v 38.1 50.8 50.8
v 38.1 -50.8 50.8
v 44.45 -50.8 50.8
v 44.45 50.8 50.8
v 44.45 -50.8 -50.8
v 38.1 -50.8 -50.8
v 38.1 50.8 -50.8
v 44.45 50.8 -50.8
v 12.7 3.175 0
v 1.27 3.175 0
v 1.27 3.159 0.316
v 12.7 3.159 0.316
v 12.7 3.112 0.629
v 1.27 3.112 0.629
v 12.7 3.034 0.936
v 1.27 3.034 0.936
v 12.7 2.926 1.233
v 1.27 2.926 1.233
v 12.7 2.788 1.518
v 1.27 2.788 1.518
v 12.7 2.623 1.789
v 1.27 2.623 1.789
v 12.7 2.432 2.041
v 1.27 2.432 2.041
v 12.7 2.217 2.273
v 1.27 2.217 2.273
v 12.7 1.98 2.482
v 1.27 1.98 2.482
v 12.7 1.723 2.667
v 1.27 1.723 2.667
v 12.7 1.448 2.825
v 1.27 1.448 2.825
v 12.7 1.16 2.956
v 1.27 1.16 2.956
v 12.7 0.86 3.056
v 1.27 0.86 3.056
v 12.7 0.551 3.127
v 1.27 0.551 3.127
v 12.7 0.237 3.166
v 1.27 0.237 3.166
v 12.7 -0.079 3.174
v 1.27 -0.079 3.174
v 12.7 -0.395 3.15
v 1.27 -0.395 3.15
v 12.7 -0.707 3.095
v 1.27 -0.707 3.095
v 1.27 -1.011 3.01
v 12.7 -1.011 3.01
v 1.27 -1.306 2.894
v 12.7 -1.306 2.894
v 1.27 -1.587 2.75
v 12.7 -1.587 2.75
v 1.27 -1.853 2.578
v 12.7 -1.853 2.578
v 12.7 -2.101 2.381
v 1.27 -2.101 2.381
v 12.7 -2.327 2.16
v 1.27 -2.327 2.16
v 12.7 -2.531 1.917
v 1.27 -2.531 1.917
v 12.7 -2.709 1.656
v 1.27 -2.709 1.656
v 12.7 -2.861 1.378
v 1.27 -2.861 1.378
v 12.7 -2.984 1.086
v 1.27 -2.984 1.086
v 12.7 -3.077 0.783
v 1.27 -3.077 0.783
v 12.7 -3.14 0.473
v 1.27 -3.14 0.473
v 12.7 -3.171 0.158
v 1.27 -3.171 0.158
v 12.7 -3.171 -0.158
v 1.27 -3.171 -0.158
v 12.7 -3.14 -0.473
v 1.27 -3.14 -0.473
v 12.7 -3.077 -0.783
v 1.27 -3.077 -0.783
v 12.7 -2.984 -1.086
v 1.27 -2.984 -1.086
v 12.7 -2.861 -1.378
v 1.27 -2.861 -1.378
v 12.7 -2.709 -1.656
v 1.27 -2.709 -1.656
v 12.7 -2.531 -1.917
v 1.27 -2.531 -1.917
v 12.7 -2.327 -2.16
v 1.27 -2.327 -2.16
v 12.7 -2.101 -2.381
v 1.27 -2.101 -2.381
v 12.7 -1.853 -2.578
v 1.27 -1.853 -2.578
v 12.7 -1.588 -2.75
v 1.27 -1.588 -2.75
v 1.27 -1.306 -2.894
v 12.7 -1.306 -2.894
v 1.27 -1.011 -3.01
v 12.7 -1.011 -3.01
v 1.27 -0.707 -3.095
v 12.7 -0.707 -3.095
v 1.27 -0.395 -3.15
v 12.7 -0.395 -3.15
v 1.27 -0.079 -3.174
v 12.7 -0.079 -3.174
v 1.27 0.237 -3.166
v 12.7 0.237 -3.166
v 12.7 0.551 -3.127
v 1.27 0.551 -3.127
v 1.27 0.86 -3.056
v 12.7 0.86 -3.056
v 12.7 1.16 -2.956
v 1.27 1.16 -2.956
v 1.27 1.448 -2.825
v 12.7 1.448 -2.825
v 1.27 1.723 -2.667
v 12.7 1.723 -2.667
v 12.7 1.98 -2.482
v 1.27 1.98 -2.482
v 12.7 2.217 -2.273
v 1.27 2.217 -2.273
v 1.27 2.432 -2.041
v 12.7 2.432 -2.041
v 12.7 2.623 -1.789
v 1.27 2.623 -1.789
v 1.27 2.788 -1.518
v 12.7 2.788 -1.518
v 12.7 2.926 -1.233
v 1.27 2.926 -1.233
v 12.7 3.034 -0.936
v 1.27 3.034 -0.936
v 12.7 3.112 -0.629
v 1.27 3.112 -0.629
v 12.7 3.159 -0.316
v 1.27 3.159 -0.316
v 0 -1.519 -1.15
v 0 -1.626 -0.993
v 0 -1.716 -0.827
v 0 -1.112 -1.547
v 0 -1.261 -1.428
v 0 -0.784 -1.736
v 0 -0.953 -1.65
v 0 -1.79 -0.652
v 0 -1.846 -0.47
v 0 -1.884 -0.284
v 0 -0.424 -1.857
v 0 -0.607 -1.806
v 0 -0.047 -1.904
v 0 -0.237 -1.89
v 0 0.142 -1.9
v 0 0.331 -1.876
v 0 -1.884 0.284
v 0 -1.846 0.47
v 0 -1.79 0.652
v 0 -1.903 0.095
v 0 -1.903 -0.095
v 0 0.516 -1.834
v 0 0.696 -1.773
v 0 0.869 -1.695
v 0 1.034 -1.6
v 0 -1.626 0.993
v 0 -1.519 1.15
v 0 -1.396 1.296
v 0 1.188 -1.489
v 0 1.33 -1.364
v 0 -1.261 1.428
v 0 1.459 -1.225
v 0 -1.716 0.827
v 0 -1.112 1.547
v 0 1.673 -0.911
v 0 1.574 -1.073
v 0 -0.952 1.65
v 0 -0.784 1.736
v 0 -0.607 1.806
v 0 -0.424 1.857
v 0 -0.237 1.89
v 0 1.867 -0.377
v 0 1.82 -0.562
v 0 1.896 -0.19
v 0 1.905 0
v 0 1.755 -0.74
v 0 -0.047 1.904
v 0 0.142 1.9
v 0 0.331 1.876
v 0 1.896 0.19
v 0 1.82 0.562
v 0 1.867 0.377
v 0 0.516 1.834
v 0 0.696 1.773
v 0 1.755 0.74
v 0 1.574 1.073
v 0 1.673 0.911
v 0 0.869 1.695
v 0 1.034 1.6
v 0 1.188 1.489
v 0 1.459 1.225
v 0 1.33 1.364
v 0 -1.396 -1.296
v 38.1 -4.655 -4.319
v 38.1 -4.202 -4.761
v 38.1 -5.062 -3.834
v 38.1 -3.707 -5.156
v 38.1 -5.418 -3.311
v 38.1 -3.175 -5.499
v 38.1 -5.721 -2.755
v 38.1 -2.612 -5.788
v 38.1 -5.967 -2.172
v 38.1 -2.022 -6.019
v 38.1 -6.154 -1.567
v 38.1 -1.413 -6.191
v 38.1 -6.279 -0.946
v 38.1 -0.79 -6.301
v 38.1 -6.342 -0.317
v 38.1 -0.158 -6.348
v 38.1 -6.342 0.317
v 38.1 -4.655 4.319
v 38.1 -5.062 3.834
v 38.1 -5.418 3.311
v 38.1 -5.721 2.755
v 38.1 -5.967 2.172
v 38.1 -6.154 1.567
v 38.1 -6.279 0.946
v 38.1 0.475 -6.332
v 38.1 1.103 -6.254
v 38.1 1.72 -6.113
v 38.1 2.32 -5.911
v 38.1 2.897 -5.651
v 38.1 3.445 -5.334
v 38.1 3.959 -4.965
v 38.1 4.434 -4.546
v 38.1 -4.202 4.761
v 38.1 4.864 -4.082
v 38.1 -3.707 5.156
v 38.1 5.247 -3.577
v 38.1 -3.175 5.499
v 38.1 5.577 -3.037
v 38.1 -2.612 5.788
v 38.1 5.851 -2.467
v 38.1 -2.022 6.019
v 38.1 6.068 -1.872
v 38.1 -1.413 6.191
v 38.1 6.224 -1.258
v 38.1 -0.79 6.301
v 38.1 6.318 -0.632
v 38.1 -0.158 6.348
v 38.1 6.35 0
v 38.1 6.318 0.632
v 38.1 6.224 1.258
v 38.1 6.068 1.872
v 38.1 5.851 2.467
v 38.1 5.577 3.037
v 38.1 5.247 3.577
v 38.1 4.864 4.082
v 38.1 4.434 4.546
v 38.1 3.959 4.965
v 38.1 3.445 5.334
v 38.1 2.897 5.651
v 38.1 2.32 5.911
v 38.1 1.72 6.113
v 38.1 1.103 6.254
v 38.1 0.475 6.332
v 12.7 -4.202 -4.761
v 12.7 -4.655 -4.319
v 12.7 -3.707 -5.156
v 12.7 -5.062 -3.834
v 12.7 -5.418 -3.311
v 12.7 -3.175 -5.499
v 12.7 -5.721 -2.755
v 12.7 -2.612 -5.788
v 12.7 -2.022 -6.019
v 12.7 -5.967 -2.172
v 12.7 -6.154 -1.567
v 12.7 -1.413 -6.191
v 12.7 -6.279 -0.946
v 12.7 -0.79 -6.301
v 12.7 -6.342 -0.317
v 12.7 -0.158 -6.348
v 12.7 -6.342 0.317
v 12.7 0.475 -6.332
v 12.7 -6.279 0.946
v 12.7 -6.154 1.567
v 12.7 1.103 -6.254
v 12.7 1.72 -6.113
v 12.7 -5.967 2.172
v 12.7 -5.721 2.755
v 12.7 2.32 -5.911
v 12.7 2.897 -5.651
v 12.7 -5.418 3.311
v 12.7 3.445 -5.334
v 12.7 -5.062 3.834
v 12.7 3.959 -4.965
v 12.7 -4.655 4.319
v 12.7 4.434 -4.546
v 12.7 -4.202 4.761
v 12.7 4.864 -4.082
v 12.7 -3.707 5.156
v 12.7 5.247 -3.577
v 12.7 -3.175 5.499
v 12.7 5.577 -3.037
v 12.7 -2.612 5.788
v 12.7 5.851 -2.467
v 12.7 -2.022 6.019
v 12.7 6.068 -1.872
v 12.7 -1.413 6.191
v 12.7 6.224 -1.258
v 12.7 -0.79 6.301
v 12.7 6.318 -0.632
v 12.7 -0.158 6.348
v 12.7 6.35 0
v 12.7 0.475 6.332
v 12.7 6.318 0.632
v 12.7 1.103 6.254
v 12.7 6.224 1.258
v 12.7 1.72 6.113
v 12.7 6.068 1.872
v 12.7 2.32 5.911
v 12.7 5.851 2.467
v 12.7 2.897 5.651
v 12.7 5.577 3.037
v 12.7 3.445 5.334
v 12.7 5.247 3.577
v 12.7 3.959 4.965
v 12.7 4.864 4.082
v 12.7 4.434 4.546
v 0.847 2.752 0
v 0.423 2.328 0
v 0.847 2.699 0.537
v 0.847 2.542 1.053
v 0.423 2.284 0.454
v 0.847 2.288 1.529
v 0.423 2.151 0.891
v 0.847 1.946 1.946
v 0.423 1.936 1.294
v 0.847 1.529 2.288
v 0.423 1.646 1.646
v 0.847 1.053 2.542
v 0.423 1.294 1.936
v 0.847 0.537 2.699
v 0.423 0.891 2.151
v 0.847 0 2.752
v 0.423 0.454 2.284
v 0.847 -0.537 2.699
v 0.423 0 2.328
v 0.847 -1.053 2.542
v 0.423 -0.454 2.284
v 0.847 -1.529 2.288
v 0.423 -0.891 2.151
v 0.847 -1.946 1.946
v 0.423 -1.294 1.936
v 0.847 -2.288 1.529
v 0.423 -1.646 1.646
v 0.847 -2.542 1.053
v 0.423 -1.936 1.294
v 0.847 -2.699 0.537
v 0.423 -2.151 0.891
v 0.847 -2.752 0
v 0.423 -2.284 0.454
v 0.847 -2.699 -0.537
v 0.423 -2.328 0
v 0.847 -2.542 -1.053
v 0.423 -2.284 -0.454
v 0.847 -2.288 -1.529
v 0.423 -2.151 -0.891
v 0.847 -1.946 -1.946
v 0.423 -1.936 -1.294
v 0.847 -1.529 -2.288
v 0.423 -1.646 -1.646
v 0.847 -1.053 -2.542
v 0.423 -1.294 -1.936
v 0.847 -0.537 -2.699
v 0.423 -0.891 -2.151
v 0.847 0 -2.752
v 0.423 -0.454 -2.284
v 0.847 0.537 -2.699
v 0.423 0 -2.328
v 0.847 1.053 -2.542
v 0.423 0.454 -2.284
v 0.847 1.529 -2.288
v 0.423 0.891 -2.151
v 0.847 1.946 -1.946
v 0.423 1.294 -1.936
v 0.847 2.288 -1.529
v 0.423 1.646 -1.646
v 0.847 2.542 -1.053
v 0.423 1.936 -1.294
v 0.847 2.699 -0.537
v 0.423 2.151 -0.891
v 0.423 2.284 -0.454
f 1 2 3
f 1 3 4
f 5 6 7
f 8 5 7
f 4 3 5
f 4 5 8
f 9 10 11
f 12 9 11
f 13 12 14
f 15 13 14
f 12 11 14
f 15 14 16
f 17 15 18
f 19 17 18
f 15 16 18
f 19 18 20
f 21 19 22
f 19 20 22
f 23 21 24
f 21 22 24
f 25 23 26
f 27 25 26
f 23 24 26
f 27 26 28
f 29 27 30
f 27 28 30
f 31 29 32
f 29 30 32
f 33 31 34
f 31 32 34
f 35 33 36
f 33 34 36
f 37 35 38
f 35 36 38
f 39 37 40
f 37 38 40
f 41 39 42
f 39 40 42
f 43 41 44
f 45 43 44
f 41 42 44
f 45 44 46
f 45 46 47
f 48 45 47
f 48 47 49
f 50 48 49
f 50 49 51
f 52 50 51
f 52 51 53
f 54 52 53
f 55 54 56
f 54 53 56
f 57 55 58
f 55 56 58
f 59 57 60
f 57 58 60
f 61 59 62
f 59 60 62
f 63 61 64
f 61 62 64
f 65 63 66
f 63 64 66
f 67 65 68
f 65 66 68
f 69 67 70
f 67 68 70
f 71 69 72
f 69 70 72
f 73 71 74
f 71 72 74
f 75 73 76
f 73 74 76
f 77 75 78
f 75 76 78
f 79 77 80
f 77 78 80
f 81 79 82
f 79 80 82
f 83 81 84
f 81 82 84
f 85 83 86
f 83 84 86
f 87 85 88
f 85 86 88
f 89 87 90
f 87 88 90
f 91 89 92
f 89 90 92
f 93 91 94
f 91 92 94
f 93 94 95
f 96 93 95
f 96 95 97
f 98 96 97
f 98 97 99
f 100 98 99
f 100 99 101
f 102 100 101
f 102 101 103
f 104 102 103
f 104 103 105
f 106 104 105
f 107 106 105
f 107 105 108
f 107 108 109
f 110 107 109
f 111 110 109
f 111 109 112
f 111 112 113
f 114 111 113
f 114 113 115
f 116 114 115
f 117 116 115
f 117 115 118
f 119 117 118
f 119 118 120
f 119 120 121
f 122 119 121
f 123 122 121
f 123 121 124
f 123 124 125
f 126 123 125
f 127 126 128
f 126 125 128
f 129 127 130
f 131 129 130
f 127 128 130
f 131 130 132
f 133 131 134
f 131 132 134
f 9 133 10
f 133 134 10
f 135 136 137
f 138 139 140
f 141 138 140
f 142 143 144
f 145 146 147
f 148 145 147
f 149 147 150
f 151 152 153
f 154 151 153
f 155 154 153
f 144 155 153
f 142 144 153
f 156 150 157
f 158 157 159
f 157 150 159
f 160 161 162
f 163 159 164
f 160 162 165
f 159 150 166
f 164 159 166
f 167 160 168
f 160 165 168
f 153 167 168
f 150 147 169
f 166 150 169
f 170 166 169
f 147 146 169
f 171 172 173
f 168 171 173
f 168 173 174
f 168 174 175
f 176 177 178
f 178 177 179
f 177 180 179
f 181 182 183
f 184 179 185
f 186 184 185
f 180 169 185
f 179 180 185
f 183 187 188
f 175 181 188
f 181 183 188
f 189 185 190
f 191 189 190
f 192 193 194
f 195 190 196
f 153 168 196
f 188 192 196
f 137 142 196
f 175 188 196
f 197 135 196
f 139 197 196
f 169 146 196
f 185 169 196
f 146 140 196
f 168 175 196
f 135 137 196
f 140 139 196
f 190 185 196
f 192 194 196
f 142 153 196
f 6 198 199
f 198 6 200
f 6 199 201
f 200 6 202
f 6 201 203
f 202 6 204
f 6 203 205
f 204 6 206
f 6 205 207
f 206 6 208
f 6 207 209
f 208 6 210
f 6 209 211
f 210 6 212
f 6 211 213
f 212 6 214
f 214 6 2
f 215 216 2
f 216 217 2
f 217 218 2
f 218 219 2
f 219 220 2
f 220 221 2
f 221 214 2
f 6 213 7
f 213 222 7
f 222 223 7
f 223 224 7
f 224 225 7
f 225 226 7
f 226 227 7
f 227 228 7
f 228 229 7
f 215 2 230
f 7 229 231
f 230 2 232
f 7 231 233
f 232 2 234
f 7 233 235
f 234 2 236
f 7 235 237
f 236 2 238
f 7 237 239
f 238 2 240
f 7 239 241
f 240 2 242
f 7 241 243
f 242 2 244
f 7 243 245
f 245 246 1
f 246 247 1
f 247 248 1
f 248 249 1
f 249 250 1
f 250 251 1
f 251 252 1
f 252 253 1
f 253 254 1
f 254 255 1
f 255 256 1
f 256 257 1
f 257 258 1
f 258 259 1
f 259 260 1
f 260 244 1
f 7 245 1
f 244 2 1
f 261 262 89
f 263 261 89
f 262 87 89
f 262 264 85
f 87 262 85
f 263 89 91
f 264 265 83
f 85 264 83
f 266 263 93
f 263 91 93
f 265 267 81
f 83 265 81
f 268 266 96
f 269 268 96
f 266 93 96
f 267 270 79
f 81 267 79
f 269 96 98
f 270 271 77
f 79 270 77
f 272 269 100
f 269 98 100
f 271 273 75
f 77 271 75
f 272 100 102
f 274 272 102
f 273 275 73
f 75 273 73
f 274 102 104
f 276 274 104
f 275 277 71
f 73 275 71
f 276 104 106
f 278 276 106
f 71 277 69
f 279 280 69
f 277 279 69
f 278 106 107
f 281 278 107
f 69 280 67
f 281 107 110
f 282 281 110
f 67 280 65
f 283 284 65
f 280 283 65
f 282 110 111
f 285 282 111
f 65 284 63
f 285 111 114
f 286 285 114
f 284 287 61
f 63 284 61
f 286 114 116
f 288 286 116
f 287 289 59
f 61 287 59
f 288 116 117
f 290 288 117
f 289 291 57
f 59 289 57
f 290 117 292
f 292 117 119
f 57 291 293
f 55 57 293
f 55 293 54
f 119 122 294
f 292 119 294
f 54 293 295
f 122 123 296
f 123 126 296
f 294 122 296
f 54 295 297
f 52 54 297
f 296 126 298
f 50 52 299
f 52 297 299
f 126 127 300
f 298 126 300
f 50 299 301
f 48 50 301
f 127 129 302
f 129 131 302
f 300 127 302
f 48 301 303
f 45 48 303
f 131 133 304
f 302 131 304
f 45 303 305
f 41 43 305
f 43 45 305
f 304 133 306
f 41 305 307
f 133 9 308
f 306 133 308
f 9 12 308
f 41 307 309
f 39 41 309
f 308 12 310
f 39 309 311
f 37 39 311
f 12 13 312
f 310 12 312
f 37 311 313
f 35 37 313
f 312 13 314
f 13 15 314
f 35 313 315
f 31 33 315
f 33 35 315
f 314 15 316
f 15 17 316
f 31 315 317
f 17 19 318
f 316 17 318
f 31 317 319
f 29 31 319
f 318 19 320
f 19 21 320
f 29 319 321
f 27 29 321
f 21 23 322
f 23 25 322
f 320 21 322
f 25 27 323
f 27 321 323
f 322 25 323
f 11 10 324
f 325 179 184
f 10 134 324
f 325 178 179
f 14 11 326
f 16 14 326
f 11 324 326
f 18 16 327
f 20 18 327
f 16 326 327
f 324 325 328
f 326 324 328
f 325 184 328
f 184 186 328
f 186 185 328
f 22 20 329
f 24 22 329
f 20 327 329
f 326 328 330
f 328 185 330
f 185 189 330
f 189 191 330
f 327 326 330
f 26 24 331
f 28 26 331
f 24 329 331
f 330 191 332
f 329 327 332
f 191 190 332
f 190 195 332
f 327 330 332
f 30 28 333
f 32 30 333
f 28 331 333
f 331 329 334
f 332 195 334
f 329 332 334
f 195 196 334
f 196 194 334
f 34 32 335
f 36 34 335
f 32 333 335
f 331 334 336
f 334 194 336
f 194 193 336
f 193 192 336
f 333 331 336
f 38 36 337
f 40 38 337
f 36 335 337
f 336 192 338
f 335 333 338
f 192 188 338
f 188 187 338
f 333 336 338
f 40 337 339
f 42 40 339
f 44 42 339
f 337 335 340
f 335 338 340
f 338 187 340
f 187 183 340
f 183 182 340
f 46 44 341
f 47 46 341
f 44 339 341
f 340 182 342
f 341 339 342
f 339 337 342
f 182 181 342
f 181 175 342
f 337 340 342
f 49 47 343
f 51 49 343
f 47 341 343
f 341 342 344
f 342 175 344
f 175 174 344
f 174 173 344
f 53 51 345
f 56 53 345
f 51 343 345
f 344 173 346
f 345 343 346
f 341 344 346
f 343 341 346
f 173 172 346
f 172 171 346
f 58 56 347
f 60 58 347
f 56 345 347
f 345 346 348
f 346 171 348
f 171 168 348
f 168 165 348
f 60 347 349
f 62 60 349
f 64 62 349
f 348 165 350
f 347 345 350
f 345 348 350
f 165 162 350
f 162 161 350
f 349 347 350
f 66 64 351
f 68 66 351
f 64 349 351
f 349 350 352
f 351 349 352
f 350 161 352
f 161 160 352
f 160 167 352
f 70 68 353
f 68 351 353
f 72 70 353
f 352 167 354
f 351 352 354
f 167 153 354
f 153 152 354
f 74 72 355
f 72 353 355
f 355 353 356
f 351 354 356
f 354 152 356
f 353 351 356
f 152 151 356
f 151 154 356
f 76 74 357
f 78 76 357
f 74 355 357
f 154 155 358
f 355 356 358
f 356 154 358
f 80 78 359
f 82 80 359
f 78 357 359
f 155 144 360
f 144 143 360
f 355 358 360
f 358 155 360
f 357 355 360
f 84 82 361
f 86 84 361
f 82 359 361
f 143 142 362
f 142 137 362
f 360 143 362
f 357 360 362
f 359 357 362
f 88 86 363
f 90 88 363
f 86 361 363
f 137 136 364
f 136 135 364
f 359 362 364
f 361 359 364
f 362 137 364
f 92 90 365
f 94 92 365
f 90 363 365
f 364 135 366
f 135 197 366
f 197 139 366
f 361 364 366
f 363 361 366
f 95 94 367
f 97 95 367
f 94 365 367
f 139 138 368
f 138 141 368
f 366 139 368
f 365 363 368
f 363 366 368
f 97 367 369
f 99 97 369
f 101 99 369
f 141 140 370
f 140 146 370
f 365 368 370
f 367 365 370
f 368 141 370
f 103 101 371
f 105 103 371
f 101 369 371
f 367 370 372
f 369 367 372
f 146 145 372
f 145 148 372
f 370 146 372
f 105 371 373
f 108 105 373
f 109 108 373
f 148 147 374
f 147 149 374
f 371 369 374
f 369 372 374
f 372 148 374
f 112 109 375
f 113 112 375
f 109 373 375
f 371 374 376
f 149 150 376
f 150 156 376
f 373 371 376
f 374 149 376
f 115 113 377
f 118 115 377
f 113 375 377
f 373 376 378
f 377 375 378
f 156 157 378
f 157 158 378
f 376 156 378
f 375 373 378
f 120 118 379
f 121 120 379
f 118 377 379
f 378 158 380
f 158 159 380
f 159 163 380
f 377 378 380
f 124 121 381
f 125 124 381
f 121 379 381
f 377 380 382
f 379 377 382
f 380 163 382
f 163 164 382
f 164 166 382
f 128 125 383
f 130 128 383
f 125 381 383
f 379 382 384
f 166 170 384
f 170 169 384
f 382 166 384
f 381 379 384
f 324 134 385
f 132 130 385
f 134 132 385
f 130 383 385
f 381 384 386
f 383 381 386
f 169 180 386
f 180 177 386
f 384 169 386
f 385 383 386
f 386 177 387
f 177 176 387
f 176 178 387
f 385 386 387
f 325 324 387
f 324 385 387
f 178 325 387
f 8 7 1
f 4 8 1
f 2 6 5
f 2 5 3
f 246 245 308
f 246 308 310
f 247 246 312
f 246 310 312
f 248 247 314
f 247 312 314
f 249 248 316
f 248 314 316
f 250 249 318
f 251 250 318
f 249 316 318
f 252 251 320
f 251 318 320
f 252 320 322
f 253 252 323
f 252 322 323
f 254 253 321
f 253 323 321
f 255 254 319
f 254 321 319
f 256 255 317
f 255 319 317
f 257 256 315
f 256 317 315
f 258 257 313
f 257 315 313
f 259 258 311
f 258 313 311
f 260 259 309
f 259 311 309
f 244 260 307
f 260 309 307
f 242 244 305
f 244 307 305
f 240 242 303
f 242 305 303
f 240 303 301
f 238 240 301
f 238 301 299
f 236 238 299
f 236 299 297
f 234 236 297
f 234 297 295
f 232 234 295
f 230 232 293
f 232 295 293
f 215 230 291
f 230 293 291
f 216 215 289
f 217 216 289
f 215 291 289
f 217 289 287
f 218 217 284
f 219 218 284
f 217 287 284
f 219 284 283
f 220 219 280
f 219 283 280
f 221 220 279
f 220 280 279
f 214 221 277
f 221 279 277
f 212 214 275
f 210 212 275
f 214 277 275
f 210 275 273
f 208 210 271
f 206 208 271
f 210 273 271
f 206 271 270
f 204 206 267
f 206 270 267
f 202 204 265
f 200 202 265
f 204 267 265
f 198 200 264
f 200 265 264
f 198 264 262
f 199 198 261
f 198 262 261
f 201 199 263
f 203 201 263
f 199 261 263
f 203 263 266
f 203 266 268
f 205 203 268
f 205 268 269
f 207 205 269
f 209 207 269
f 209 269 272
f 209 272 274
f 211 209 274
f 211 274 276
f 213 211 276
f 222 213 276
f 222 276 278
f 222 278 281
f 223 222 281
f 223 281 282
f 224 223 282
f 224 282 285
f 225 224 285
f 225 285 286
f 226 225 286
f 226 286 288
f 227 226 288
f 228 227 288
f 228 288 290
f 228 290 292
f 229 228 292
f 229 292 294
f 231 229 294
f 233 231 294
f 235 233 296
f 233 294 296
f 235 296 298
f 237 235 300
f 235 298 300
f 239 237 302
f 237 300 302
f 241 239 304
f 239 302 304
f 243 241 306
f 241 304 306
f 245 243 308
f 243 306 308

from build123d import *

# Parameters (mm, degrees)
F0_R     = 3.175
F1_DEPTH = 12.7
F2_SIZE  = 1.27
F3_R     = 6.35
F4_DEPTH = 25.4
F5_W     = 101.6
F5_H     = 101.6
F5_R     = 6.35
F6_DEPTH = 6.35


with BuildPart() as f1:
    # F0 (on Right) → F1 (new body)
    with BuildSketch(Plane.YZ):
        Circle(F0_R)
    extrude(amount=F1_DEPTH)

    # F2
    f2_edges = [f1.edges().sort_by_distance(p)[0] for p in [
        (0, -3.175, 0),
    ]]
    chamfer(f2_edges, length=F2_SIZE)

    # F3 (on face) → F4 (join)
    with BuildSketch(Plane.YZ.offset(12.7)):
        Circle(F3_R)
    extrude(amount=F4_DEPTH)

    # F5 (on face) → F6 (join)
    with BuildSketch(Plane.YZ.offset(38.1)):
        Rectangle(F5_W, F5_H)
        Circle(F5_R, mode=Mode.SUBTRACT)
        Circle(F5_R)
    extrude(amount=F6_DEPTH)


solid = f1.part
